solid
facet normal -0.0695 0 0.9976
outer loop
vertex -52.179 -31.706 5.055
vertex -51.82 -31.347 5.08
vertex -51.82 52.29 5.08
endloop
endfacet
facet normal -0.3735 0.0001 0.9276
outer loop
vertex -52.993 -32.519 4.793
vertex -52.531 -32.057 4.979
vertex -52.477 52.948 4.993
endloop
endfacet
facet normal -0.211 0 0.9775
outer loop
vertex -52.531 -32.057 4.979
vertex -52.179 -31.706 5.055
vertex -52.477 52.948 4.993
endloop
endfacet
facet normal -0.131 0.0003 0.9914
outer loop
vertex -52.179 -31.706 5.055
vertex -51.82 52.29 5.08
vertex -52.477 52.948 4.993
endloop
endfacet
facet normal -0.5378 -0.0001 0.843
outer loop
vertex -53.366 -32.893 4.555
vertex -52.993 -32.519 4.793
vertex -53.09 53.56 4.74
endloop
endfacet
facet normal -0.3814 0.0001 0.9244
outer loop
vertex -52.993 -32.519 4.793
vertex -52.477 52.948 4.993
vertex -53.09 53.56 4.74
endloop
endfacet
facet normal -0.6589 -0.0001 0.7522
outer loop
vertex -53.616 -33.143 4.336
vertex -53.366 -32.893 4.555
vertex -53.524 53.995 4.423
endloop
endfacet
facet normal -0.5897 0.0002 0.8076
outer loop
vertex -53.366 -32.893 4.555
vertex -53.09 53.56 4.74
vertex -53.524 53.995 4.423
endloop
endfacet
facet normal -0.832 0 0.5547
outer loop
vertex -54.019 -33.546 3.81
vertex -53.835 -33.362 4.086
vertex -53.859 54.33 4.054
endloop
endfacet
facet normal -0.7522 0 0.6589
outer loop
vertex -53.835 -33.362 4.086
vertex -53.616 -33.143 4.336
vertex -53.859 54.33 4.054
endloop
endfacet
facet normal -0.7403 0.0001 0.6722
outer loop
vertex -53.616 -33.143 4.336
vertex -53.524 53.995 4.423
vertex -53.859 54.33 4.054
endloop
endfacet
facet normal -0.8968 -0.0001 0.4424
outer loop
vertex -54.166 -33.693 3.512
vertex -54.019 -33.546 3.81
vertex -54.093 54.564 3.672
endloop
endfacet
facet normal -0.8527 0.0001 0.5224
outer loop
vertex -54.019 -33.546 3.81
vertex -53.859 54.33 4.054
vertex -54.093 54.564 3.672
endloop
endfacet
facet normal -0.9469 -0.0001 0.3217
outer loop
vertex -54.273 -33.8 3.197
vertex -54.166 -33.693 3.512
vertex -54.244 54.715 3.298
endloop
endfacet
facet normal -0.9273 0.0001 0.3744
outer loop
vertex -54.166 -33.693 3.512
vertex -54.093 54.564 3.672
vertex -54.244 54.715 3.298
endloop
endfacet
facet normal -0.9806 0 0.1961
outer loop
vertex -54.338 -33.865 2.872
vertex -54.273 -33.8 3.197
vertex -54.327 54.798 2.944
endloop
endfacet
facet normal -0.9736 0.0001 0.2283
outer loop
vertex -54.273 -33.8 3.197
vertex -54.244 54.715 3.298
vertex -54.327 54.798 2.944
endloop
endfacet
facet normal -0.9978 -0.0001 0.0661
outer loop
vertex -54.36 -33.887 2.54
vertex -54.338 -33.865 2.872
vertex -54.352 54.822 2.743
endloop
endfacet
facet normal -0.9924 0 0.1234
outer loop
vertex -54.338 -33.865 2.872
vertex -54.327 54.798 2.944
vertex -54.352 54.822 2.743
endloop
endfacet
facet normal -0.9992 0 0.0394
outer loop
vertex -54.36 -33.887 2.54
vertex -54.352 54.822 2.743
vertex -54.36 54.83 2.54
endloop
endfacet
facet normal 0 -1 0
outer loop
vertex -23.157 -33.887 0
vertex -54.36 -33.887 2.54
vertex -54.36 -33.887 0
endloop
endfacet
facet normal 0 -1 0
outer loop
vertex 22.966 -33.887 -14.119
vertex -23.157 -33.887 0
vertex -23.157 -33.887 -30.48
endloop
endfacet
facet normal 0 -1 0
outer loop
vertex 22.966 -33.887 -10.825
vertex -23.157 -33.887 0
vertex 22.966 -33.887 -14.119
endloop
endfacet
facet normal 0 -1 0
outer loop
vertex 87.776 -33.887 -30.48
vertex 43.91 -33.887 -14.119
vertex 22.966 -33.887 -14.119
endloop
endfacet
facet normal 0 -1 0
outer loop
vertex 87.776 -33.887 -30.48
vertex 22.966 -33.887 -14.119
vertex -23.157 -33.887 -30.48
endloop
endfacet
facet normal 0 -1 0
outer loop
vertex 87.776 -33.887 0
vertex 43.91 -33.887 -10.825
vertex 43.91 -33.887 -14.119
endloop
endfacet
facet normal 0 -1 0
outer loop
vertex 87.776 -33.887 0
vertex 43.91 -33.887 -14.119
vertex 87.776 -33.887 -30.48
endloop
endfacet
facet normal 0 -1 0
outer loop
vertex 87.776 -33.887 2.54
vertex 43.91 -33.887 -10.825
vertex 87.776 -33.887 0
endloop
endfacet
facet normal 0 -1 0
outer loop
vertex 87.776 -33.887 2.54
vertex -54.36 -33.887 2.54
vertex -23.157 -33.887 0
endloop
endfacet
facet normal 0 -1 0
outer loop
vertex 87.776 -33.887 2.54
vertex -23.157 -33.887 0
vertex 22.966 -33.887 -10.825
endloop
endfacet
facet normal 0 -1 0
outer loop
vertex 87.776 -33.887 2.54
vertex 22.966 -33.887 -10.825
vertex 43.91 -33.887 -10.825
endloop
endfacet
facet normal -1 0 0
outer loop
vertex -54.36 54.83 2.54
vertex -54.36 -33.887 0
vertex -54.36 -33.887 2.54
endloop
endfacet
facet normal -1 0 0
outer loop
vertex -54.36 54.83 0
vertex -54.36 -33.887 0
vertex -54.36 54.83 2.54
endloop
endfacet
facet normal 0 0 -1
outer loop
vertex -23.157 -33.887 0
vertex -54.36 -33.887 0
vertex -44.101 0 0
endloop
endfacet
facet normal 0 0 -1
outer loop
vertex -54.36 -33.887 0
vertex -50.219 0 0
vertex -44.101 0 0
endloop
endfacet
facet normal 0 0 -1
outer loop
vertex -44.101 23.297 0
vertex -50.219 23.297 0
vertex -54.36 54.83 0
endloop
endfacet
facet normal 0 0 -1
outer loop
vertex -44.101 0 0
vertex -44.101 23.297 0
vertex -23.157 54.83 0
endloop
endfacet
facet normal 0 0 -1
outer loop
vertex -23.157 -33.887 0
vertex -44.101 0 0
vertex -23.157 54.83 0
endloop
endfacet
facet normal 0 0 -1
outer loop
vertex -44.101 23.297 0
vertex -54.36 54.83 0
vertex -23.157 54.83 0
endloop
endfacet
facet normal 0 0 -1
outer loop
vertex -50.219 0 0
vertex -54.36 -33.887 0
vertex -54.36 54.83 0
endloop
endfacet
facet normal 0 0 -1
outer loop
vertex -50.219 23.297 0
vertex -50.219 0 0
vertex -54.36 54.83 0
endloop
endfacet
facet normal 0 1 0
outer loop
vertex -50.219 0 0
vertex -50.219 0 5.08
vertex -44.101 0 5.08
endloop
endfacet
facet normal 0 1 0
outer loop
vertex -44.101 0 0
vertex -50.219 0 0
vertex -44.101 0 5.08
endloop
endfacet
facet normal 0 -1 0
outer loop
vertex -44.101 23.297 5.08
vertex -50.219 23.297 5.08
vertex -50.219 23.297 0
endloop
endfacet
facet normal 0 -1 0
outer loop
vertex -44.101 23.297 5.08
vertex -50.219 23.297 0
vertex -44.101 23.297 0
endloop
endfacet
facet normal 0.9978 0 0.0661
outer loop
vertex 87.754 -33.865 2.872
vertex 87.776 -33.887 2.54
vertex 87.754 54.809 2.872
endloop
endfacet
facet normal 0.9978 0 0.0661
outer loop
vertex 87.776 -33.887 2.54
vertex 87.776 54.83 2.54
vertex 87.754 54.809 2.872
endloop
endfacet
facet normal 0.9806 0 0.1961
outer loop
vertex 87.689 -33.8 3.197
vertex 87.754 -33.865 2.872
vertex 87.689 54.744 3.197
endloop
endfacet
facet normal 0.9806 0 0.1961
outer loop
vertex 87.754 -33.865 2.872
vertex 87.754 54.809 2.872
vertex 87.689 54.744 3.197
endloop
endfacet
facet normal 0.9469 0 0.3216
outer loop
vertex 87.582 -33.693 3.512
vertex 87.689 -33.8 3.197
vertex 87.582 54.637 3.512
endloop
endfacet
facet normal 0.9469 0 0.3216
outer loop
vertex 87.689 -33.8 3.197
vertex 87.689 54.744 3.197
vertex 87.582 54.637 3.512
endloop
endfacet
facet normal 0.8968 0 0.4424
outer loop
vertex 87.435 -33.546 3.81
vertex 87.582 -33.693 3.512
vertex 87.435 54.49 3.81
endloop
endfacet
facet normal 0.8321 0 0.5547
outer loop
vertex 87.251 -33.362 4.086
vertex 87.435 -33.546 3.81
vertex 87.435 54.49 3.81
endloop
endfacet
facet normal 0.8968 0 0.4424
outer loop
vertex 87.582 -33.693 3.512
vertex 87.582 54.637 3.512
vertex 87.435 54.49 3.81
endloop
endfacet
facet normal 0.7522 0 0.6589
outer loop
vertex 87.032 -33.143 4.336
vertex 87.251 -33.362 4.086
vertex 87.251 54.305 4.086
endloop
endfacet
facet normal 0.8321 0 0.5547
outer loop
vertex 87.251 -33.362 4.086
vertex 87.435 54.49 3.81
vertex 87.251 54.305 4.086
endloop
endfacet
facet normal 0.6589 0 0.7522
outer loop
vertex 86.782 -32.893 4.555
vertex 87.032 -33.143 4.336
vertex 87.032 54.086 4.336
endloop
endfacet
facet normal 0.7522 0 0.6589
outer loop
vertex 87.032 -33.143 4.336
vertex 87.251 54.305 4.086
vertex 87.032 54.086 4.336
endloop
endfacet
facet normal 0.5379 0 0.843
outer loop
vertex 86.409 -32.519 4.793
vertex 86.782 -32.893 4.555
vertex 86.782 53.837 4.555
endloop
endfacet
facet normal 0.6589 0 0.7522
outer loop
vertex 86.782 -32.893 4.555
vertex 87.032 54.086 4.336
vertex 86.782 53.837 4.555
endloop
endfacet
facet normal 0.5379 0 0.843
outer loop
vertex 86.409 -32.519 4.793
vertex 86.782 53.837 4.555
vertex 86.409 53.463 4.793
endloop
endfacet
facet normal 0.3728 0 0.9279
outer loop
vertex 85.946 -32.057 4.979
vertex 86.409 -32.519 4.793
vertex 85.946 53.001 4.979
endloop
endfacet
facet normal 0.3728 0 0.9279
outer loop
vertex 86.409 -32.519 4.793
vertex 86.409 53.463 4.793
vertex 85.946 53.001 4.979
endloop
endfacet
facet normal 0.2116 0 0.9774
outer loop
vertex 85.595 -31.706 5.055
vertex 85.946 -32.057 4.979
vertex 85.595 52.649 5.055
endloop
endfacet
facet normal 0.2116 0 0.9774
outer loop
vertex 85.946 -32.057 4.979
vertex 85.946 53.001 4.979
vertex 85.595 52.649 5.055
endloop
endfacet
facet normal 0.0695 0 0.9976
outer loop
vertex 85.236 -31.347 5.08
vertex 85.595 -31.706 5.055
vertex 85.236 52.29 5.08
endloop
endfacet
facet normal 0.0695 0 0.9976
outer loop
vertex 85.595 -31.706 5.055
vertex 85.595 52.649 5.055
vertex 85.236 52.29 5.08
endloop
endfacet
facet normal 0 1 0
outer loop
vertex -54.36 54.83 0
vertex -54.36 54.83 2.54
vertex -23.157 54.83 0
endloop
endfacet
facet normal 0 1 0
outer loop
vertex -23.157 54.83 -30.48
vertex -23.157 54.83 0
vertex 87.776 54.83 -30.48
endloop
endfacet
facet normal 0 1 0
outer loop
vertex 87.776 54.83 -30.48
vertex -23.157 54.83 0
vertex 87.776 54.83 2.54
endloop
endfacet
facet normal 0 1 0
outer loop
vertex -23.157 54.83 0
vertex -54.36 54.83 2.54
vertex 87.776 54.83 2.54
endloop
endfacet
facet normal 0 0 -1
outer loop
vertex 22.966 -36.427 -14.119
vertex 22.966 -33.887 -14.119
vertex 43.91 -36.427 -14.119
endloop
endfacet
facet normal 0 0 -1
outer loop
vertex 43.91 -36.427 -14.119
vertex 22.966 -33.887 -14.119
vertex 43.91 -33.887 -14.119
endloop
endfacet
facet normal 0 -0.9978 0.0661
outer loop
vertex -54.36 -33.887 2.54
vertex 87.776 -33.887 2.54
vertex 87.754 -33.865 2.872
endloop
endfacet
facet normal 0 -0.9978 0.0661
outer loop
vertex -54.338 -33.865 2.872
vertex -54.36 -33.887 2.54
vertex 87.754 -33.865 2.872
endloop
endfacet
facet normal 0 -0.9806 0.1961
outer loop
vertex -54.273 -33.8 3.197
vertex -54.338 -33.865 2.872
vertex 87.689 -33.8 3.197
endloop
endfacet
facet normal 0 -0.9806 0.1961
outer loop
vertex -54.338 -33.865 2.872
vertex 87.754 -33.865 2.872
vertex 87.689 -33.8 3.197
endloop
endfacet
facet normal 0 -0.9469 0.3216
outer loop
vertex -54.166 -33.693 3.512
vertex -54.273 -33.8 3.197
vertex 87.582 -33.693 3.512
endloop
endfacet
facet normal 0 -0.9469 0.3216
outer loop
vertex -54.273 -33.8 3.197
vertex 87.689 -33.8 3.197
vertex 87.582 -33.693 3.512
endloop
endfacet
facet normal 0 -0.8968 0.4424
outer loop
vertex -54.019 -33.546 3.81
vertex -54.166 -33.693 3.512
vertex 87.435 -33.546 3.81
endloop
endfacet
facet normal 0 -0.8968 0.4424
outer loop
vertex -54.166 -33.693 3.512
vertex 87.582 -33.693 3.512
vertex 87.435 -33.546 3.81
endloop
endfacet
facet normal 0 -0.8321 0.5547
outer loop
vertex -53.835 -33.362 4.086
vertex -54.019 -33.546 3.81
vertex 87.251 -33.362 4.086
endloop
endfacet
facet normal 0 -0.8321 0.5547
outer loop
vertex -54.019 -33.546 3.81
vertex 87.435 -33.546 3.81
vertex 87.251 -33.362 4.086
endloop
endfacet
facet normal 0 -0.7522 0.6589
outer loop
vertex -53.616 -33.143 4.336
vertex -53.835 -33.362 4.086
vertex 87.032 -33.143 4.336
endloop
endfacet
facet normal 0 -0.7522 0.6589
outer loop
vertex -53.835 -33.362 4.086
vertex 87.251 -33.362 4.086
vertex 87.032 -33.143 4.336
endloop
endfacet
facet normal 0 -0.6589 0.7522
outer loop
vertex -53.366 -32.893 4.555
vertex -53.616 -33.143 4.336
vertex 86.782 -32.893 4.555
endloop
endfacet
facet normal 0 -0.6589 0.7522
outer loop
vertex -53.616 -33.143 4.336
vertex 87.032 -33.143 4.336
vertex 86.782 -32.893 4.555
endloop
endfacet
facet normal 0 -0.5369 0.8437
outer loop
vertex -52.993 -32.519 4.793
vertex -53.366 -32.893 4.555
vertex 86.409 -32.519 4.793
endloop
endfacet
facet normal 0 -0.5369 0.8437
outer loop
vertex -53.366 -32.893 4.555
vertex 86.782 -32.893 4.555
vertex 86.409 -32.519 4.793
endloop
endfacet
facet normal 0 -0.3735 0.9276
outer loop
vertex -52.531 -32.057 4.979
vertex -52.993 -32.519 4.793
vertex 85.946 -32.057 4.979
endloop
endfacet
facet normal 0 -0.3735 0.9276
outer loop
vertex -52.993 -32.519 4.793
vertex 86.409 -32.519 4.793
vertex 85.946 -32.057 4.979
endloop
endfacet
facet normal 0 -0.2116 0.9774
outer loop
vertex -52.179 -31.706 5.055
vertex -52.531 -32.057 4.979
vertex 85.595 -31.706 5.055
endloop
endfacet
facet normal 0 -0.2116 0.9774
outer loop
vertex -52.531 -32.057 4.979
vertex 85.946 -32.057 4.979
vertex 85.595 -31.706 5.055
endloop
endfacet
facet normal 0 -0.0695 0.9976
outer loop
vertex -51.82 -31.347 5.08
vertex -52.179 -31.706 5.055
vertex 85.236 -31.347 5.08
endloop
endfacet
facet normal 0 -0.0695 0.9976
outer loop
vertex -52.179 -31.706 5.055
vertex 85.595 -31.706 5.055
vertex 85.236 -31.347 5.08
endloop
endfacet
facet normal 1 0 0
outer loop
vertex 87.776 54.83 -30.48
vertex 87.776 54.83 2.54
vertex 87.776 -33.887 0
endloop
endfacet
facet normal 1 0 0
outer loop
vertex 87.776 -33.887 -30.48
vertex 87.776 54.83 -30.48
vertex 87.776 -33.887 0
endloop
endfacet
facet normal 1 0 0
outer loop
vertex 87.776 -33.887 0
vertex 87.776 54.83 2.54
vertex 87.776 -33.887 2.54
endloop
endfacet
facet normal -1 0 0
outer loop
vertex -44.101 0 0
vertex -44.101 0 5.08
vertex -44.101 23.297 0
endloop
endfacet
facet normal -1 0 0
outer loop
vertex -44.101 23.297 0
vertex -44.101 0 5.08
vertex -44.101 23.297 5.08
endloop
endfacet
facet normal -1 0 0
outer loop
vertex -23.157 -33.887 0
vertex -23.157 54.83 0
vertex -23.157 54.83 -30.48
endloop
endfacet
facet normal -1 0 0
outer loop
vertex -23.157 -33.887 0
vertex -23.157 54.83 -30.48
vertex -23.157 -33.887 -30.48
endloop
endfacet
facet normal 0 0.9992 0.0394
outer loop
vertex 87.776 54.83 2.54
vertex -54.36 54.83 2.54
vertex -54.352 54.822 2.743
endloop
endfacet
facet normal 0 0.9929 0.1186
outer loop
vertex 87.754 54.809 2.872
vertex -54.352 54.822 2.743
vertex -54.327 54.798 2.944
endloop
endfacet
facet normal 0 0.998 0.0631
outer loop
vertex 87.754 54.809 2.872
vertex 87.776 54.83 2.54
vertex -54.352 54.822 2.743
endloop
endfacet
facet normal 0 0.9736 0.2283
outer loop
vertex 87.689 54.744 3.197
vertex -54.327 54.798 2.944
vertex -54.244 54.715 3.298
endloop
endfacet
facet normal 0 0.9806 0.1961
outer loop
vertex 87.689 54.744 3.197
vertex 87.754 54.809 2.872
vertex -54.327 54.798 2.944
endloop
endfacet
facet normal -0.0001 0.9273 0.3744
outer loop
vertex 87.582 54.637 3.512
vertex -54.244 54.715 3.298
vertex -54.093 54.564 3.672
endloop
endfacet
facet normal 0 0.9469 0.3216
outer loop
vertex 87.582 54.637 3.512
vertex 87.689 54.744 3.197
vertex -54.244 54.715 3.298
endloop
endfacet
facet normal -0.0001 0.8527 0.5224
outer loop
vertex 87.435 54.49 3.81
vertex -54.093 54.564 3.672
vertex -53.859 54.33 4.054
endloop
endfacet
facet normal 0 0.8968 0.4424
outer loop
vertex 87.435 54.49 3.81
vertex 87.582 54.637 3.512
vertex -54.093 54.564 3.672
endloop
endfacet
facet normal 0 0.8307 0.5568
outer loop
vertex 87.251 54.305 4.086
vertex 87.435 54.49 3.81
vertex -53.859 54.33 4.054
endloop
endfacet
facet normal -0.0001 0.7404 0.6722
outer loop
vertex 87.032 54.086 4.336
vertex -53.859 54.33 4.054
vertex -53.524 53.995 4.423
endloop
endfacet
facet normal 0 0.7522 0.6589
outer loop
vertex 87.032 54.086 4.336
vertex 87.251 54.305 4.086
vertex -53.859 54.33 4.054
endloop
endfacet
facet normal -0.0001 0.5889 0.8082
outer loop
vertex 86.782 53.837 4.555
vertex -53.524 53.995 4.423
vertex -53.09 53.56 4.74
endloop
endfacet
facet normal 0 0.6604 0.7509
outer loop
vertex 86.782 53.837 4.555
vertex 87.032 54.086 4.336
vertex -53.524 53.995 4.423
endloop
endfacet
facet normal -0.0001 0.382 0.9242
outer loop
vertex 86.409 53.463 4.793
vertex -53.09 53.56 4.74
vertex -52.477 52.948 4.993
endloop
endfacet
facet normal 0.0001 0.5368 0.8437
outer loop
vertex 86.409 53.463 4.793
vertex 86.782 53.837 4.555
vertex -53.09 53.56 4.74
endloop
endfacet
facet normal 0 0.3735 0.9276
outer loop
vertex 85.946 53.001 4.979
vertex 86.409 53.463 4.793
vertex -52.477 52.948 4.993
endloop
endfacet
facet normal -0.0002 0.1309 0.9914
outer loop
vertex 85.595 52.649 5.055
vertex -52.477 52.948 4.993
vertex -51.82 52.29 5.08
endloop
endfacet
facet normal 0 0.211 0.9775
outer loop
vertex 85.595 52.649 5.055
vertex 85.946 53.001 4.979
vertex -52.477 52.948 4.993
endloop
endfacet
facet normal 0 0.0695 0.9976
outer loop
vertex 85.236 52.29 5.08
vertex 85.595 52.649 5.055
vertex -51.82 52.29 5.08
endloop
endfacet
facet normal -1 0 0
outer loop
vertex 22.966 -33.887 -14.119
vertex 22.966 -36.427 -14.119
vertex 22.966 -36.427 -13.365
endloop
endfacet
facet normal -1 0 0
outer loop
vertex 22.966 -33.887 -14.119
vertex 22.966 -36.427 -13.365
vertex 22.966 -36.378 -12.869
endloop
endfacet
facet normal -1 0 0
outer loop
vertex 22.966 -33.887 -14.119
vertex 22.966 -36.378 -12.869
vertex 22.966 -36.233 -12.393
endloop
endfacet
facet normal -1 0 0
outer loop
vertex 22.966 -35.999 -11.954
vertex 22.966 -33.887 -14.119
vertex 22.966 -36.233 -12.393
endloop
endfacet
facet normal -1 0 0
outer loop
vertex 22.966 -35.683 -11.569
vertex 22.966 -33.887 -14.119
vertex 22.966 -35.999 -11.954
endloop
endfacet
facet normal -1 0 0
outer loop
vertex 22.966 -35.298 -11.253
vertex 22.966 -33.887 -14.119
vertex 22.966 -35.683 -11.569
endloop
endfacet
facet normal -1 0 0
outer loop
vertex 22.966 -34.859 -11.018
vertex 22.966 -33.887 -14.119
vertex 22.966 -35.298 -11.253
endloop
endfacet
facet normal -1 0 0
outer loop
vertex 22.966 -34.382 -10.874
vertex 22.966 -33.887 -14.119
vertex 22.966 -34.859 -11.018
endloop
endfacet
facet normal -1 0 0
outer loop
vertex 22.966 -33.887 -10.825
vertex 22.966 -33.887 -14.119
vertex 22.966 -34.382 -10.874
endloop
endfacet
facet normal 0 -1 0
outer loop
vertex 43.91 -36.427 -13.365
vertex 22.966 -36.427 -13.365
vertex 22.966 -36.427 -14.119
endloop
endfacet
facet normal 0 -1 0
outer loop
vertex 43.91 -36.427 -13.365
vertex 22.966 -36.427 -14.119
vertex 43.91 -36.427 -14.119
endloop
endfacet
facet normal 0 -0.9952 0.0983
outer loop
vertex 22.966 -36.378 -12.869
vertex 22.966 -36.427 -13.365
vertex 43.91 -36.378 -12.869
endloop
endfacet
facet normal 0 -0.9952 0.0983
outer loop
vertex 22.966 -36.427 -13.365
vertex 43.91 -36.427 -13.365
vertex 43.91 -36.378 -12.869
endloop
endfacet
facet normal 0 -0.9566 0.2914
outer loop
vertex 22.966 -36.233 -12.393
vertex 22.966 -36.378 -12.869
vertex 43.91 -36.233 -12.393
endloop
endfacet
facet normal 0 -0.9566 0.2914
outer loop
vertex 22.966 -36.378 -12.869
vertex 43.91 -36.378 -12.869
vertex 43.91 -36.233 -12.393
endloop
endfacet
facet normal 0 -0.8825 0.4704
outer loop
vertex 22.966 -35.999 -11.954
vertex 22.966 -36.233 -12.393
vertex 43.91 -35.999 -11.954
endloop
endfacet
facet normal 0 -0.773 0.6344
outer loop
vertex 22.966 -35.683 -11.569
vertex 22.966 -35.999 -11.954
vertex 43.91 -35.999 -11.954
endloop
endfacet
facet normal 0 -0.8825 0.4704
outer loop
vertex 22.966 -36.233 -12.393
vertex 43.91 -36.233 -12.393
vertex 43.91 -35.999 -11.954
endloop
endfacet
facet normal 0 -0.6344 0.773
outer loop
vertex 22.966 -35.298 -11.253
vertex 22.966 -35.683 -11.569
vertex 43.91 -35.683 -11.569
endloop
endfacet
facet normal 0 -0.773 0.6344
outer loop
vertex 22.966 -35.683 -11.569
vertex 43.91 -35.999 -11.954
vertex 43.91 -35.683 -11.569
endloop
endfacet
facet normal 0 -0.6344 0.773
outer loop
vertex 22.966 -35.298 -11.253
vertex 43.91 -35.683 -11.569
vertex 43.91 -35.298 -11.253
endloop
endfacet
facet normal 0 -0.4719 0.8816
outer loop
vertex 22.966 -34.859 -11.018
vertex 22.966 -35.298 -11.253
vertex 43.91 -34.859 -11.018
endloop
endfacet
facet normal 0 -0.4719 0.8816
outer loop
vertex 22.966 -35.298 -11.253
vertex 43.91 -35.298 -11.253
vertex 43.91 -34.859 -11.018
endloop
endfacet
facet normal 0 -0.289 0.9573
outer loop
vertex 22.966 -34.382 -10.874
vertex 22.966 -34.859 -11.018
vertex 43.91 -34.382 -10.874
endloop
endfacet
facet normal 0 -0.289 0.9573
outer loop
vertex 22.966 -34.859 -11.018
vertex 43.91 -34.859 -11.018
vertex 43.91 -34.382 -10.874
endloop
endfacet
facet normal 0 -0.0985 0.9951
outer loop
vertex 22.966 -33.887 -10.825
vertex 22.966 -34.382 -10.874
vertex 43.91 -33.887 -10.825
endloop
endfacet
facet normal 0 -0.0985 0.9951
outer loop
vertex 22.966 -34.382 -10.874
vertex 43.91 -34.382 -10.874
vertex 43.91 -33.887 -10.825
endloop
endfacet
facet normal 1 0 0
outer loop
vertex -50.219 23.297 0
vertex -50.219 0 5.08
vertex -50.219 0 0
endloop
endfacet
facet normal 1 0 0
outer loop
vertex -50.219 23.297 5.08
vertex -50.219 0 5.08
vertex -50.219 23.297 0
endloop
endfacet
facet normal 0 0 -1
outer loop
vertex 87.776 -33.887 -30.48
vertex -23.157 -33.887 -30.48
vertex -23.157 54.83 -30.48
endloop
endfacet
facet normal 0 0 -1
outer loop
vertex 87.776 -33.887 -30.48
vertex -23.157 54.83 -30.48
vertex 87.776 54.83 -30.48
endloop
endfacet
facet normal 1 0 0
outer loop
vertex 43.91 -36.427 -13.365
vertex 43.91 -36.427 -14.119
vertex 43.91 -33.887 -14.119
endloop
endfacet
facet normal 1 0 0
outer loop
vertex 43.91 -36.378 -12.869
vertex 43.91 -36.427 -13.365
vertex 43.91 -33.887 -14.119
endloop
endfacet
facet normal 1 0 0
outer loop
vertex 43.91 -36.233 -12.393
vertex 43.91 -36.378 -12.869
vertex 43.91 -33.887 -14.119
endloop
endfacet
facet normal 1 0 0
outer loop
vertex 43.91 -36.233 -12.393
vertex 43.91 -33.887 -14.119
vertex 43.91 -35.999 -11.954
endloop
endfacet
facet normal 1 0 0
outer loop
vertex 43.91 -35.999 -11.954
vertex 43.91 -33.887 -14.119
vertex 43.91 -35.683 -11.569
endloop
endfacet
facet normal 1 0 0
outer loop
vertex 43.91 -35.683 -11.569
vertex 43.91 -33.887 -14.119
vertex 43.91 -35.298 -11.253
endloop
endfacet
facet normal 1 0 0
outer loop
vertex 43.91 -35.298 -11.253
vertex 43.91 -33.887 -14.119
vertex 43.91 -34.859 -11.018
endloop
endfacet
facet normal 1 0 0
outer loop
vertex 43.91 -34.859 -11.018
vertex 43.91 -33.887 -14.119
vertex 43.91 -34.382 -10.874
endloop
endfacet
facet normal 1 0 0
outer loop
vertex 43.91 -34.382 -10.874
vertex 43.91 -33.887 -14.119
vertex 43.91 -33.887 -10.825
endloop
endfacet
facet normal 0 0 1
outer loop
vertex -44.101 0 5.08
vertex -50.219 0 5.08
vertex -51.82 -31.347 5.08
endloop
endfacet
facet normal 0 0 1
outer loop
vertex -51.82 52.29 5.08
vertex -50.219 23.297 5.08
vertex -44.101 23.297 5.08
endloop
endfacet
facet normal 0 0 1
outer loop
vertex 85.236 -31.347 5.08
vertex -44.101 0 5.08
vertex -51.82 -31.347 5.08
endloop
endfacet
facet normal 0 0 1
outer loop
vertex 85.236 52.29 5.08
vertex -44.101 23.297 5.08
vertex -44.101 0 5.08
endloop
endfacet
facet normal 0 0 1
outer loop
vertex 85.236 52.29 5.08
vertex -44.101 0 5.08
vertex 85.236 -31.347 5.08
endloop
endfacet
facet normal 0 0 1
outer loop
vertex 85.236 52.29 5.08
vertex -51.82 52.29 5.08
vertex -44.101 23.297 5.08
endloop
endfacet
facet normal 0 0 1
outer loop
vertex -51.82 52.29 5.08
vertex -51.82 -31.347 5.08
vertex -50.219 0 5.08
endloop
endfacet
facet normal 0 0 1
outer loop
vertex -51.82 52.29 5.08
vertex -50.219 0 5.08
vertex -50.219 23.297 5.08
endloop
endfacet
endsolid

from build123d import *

# Parameters (mm, degrees)
F0_W     = 142.1354152262
F0_H     = 88.716968894
F1_DEPTH = 5.08
F2_W     = 6.1184130609
F2_H     = 23.2970286161
F3_DEPTH = 25.4
F4_W     = 110.9326332808
F4_H     = 88.716968894
F5_DEPTH = 30.48
F6_W     = 20.9437925369
F6_H     = 3.2945293933
F7_DEPTH = 2.54
F8_R     = 2.54
F9_R     = 2.53999


# Not quite as in the source:
# - a fillet or chamfer is up to 0.001 mm smaller than in the source, because OpenCascade refuses the exact size


with BuildPart() as f1:
    # F0 (on Top) → F1 (new body)
    with BuildSketch(Plane.XY):
        with Locations((16.7079698294, 10.4718953371)):
            Rectangle(F0_W, F0_H)
    extrude(amount=F1_DEPTH)

    # F2 (on face) → F3 (cut)
    with BuildSketch(Plane.XY.offset(5.08)):
        with Locations((-47.1599567682, 11.648514308)):
            Rectangle(F2_W, F2_H)
    extrude(amount=-F3_DEPTH, mode=Mode.SUBTRACT)

    # F4 (on face) → F5 (join)
    with BuildSketch(Plane(origin=(0, 0, 0), x_dir=(1, 0, 0), z_dir=(0, 0, -1))):
        with Locations((32.3093608022, -10.4718953371)):
            Rectangle(F4_W, F4_H)
    extrude(amount=F5_DEPTH)

    # F6 (on face) → F7 (join)
    with BuildSketch(Plane.XZ.offset(33.8865891099)):
        with Locations((33.4383537993, -12.4721480533)):
            Rectangle(F6_W, F6_H)
    extrude(amount=F7_DEPTH)

    # F8
    f8_edges = [f1.edges().sort_by_distance(p)[0] for p in [
        (16.70797, -33.886589, 5.08),
        (-54.359738, 10.471895, 5.08),
        (16.70797, 54.83038, 5.08),
        (87.775677, 10.471895, 5.08),
    ]]
    fillet(f8_edges, radius=F8_R)

    # F9 (radius 2.54 in the source; OpenCascade refuses exactly that, so slightly less here)
    f9_edges = [f1.edges().sort_by_distance(p)[0] for p in [
        (33.438354, -36.426589, -10.824883),
    ]]
    fillet(f9_edges, radius=F9_R)


solid = f1.part
